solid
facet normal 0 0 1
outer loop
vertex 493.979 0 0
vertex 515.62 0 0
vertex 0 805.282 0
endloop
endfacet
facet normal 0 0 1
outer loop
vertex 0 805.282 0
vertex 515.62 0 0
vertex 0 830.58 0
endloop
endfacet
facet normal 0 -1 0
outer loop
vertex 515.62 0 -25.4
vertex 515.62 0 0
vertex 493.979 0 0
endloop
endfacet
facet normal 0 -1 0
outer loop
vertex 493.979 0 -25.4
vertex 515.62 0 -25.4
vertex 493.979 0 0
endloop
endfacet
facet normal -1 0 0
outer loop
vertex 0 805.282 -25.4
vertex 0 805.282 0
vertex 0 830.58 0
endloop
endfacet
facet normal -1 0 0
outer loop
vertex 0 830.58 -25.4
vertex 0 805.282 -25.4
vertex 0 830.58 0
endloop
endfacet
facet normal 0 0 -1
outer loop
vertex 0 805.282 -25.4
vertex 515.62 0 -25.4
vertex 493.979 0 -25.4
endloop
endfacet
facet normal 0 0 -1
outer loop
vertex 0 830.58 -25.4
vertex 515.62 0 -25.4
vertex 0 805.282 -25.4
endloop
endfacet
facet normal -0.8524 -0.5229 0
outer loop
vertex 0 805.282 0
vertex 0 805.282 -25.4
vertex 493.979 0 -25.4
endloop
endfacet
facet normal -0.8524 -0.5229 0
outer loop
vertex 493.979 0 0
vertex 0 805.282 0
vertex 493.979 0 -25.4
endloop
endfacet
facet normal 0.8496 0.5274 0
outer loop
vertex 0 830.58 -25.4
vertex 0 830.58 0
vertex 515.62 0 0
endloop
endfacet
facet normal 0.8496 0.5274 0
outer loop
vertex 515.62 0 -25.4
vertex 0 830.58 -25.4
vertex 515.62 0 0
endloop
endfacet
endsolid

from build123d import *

# Parameters (mm, degrees)
BOSS_EXTRUDE1_DEPTH = 25.4
CUT_EXTRUDE2_DEPTH  = 127
CUT_EXTRUDE3_DEPTH  = 127


with BuildPart() as part:
    # Sketch1 → Boss-Extrude1 (new body)
    with BuildSketch(Plane.XY):
        Polygon((0, 830.58), (515.62, 0), (494.040159482, -13.396659404), (0, 782.421725573), align=None)
    extrude(amount=-BOSS_EXTRUDE1_DEPTH)

    # Sketch2 → Cut-Extrude2 (cut)
    with BuildSketch(Plane.XY):
        Polygon((515.62, 0), (485.723578873, 0), (494.040159482, -13.396659404), align=None)
    extrude(amount=-CUT_EXTRUDE2_DEPTH, mode=Mode.SUBTRACT)

    # Sketch4 → Cut-Extrude3 (cut)
    with BuildSketch(Plane(origin=(0, 0, -25.4), x_dir=(-1, 0, 0), z_dir=(0, 0, -1))):
        Polygon((0, 805.281725573), (-493.978617069, 0), (-485.723578873, 0), (0, 782.421725573), align=None)
    extrude(amount=-CUT_EXTRUDE3_DEPTH, mode=Mode.SUBTRACT)


solid = part.part
